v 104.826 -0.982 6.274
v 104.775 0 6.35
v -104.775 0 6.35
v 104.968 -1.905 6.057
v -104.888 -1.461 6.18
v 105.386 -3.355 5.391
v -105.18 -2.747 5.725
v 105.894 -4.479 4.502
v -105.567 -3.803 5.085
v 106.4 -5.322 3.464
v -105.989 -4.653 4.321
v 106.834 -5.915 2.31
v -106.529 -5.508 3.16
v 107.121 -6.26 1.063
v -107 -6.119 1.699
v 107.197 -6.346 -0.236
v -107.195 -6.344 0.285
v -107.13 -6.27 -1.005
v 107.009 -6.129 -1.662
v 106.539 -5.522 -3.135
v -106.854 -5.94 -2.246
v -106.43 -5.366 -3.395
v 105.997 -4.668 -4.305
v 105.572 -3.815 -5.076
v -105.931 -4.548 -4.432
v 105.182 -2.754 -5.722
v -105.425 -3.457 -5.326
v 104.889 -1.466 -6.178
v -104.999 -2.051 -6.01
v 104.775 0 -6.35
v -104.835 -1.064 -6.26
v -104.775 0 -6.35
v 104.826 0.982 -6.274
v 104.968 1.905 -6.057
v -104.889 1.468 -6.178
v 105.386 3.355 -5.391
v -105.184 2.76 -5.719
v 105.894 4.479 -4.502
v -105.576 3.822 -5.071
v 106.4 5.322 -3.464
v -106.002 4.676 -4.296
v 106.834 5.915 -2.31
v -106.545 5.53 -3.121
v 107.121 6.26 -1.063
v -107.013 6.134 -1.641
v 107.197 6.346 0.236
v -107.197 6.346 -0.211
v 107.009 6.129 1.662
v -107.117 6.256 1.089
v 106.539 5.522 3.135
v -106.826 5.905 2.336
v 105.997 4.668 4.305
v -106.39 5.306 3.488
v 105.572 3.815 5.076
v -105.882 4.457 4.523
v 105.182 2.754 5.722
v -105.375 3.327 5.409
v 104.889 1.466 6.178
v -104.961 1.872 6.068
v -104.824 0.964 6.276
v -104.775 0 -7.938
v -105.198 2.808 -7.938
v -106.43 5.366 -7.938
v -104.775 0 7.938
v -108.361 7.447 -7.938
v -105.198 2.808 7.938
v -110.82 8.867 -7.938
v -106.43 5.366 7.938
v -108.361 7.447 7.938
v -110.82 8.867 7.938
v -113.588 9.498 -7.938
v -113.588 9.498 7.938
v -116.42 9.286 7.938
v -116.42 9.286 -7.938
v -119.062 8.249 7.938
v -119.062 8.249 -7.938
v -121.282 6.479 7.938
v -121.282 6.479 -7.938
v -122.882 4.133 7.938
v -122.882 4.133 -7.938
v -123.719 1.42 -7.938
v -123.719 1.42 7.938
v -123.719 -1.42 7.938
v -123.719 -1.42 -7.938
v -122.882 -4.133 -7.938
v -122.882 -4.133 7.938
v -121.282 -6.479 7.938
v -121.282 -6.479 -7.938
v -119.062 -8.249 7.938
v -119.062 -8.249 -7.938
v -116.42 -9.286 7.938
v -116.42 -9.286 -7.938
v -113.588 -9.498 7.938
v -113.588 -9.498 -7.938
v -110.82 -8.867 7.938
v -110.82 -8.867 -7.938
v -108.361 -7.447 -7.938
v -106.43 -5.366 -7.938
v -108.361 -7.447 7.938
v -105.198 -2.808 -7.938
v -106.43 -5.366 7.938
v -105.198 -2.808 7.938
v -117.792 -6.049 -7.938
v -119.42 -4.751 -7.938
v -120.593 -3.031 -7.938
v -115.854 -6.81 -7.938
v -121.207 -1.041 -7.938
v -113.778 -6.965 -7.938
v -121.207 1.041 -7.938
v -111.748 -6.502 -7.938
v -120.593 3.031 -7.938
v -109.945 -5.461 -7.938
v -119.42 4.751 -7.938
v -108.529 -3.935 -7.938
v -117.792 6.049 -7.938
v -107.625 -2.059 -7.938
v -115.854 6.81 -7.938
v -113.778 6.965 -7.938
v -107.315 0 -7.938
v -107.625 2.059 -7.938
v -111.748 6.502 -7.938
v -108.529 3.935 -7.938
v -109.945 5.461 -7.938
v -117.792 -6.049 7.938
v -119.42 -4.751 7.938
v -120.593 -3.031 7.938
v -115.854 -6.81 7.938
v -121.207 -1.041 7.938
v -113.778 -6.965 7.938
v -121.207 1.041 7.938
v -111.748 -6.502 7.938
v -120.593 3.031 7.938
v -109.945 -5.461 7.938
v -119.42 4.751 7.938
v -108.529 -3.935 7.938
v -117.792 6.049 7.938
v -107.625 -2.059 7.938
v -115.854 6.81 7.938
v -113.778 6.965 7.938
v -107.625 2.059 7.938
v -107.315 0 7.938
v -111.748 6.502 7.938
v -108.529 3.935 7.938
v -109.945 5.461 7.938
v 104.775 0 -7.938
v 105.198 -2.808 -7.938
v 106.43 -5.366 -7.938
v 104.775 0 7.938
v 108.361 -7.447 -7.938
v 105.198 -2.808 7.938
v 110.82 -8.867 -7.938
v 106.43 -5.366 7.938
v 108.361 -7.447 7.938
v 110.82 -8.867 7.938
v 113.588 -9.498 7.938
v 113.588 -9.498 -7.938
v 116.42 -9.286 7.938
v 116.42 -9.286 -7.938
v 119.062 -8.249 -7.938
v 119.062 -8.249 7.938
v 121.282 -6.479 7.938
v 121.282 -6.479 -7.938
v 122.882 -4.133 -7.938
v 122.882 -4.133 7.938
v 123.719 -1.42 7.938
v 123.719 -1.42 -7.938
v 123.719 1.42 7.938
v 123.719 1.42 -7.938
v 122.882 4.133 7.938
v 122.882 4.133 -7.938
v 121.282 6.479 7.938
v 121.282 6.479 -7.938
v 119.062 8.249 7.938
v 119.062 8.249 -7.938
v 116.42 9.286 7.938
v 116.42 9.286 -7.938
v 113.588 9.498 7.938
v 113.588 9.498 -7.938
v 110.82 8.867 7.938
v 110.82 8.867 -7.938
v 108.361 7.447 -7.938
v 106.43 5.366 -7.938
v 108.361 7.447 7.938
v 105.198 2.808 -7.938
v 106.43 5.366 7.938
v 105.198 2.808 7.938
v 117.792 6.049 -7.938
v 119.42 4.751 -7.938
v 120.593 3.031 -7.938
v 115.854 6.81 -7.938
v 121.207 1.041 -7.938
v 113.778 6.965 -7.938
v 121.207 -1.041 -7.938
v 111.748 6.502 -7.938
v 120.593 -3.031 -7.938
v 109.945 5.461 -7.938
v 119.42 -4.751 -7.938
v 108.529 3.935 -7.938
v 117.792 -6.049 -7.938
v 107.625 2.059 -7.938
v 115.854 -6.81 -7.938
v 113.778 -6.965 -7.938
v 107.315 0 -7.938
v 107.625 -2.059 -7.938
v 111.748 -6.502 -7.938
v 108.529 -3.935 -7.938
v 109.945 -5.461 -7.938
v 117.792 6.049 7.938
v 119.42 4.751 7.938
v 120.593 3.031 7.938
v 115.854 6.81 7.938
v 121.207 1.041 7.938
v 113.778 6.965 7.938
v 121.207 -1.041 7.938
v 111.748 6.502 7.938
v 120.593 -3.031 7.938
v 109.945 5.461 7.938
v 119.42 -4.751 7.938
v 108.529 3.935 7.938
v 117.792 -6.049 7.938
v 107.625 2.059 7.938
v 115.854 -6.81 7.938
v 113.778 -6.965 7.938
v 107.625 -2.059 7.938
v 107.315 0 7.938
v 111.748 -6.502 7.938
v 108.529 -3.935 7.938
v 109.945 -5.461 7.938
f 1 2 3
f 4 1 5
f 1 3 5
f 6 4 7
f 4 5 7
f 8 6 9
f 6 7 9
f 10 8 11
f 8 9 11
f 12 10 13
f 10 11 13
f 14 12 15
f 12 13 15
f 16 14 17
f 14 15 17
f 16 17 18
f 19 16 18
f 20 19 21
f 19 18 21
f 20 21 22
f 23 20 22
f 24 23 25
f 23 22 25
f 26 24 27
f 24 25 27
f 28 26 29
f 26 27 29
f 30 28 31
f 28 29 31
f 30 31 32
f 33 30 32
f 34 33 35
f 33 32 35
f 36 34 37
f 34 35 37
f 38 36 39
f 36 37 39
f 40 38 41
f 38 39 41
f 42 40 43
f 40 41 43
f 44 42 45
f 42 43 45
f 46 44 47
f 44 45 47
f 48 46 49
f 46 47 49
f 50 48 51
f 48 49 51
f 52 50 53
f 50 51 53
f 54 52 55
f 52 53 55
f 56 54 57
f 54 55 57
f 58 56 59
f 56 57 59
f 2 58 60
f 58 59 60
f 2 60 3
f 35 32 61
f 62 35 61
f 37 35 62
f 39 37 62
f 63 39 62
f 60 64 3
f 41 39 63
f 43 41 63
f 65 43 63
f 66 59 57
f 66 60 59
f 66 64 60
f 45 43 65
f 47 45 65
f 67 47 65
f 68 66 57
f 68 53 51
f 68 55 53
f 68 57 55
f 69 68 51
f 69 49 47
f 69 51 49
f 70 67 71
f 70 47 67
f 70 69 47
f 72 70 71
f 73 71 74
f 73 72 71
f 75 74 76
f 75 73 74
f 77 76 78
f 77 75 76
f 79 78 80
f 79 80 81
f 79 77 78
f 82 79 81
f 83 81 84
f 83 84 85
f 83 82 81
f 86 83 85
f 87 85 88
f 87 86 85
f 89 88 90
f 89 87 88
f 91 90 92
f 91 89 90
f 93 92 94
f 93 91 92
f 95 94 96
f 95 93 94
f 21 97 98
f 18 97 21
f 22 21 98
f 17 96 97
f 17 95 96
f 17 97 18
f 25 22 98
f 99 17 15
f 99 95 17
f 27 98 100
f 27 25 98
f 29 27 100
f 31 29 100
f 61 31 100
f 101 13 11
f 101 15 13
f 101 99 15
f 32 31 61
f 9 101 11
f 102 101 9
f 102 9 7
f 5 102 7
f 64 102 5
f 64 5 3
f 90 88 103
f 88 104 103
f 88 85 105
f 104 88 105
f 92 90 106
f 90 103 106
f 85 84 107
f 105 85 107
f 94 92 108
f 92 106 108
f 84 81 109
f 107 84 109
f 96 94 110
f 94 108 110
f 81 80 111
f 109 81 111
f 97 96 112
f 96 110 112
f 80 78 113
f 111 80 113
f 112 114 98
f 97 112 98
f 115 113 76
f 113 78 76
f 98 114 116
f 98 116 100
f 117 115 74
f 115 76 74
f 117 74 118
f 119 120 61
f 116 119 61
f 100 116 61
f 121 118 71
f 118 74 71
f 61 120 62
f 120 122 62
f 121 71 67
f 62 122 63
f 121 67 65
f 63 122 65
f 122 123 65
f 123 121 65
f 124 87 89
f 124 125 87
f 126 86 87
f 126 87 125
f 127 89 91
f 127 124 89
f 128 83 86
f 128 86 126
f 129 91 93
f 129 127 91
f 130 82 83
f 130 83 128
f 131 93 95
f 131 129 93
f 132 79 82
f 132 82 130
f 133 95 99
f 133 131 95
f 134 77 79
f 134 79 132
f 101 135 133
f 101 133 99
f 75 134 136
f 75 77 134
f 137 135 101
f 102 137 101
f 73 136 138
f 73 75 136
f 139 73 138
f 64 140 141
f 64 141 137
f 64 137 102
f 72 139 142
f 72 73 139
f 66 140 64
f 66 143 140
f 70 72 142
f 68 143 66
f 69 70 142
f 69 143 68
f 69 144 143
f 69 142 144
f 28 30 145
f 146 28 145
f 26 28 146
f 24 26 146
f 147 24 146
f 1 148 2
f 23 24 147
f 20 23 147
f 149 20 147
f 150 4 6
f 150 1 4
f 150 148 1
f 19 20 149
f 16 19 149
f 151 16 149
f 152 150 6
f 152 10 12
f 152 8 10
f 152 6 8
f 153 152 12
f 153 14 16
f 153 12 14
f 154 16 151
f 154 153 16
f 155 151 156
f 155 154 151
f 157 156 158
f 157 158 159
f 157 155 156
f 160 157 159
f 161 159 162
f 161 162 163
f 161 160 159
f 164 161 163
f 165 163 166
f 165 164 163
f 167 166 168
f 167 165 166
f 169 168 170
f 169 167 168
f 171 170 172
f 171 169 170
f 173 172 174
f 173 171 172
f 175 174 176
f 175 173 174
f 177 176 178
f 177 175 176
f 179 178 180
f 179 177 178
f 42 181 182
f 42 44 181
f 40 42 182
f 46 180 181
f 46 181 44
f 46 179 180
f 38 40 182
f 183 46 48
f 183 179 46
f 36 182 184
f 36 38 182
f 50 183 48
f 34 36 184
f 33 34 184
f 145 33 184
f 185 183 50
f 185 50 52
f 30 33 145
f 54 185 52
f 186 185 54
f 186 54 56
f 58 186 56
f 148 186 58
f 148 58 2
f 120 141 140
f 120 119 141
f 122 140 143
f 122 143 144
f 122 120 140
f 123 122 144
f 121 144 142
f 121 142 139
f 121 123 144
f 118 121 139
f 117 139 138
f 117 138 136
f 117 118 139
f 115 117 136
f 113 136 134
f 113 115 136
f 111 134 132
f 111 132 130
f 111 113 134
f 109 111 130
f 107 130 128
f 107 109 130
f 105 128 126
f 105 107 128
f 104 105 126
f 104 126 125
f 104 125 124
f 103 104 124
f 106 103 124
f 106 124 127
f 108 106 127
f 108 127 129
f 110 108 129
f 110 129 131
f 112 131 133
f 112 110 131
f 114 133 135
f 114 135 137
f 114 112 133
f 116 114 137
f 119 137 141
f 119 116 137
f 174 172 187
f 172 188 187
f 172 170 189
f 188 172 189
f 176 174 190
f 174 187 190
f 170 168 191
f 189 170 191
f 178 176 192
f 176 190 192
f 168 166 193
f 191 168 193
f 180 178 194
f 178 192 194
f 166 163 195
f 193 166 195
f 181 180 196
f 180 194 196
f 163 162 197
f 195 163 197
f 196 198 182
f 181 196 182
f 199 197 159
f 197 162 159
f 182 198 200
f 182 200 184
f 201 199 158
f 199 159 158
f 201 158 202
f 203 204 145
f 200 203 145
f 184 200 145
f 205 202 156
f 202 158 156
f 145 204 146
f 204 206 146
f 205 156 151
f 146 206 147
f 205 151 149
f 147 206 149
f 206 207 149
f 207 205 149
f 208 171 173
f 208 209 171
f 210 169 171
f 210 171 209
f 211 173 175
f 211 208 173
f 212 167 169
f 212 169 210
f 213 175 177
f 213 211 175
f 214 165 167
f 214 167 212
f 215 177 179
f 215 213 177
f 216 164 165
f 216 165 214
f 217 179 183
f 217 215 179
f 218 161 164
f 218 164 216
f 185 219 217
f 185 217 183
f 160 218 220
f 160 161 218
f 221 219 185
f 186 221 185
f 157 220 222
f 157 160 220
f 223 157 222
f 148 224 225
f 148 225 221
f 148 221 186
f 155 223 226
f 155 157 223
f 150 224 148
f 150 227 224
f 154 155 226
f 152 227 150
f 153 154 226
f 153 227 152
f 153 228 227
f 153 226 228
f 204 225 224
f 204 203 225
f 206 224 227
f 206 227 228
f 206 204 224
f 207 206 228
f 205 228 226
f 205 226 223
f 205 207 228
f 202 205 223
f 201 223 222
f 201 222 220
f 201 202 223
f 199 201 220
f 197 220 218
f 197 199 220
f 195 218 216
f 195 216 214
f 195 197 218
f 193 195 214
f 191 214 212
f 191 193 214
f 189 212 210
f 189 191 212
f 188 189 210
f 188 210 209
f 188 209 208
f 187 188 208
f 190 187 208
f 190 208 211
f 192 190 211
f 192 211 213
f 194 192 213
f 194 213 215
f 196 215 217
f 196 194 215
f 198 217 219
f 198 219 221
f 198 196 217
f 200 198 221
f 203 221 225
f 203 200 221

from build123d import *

# Parameters (mm, degrees)
SKETCH3_R                            = 9.525
SKETCH3_R_2                          = 6.985
BOSS_EXTRUDE1_DEPTH                  = 7.9375
BOSS_EXTRUDE1_2_DEPTH                = 7.9375
BOSS_EXTRUDE2_REACH                  = 126.444
BOSS_EXTRUDE2_END_RADIUS             = 9.525
SKETCH4_R                            = 6.35
BOSS_EXTRUDE2_DIRECTION_2_REACH      = 126.444
BOSS_EXTRUDE2_DIRECTION_2_END_RADIUS = 9.525


with BuildPart() as part:
    # Sketch3 → Boss-Extrude1 (new, symmetric)
    with BuildSketch(Plane.XY):
        with Locations((-114.3, 0)):
            Circle(SKETCH3_R)
        with Locations((-114.3, 0)):
            Circle(SKETCH3_R_2, mode=Mode.SUBTRACT)
    extrude(amount=BOSS_EXTRUDE1_DEPTH, both=True)



with BuildPart() as body_2:
    # Sketch3 → Boss-Extrude1 2 (new, symmetric)
    with BuildSketch(Plane.XY):
        with Locations(Location((114.3, 0, 0), (0, 0, 180))):
            Circle(SKETCH3_R)
        with Locations(Location((114.3, 0, 0), (0, 0, 180))):
            Circle(SKETCH3_R_2, mode=Mode.SUBTRACT)
    extrude(amount=BOSS_EXTRUDE1_2_DEPTH, both=True)


with BuildPart() as part_1:
    add(part.part)

    add(body_2.part)  # Boss-Extrude2 merges body 2
    # Boss-Extrude2: up to this cylinder (the profile starts outside it)
    boss_extrude2_end = Plane(origin=(-114.3, 0, 0), z_dir=(0, 0, -1)) * Cylinder(BOSS_EXTRUDE2_END_RADIUS, 272.938, mode=Mode.PRIVATE)
    # Sketch4 → Boss-Extrude2 (add, up to the surface)
    with BuildSketch(Plane(origin=(0, 0, 0), x_dir=(0, 0, -1), z_dir=(1, 0, 0)), mode=Mode.PRIVATE) as boss_extrude2_sk1:
        with Locations(Location((0, 0, 0), (0, 0, 179.999999999))):
            Circle(SKETCH4_R)
    boss_extrude2_tool1 = extrude(boss_extrude2_sk1.sketch, amount=-BOSS_EXTRUDE2_REACH, mode=Mode.PRIVATE) - boss_extrude2_end
    add(boss_extrude2_tool1.solids().sort_by_distance((0, 0, 0))[0])

    # Boss-Extrude2 direction 2: up to this cylinder (the profile starts outside it)
    boss_extrude2_direction_2_end = Plane(origin=(114.3, 0, 0), z_dir=(0, 0, -1)) * Cylinder(BOSS_EXTRUDE2_DIRECTION_2_END_RADIUS, 272.938, mode=Mode.PRIVATE)
    # Sketch4 → Boss-Extrude2 direction 2 (add, up to the surface)
    with BuildSketch(Plane(origin=(0, 0, 0), x_dir=(0, 0, -1), z_dir=(1, 0, 0)), mode=Mode.PRIVATE) as boss_extrude2_direction_2_sk1:
        with Locations(Location((0, 0, 0), (0, 0, 179.999999999))):
            Circle(SKETCH4_R)
    boss_extrude2_direction_2_tool1 = extrude(boss_extrude2_direction_2_sk1.sketch, amount=BOSS_EXTRUDE2_DIRECTION_2_REACH, mode=Mode.PRIVATE) - boss_extrude2_direction_2_end
    add(boss_extrude2_direction_2_tool1.solids().sort_by_distance((0, 0, 0))[0])


solid = part_1.part
